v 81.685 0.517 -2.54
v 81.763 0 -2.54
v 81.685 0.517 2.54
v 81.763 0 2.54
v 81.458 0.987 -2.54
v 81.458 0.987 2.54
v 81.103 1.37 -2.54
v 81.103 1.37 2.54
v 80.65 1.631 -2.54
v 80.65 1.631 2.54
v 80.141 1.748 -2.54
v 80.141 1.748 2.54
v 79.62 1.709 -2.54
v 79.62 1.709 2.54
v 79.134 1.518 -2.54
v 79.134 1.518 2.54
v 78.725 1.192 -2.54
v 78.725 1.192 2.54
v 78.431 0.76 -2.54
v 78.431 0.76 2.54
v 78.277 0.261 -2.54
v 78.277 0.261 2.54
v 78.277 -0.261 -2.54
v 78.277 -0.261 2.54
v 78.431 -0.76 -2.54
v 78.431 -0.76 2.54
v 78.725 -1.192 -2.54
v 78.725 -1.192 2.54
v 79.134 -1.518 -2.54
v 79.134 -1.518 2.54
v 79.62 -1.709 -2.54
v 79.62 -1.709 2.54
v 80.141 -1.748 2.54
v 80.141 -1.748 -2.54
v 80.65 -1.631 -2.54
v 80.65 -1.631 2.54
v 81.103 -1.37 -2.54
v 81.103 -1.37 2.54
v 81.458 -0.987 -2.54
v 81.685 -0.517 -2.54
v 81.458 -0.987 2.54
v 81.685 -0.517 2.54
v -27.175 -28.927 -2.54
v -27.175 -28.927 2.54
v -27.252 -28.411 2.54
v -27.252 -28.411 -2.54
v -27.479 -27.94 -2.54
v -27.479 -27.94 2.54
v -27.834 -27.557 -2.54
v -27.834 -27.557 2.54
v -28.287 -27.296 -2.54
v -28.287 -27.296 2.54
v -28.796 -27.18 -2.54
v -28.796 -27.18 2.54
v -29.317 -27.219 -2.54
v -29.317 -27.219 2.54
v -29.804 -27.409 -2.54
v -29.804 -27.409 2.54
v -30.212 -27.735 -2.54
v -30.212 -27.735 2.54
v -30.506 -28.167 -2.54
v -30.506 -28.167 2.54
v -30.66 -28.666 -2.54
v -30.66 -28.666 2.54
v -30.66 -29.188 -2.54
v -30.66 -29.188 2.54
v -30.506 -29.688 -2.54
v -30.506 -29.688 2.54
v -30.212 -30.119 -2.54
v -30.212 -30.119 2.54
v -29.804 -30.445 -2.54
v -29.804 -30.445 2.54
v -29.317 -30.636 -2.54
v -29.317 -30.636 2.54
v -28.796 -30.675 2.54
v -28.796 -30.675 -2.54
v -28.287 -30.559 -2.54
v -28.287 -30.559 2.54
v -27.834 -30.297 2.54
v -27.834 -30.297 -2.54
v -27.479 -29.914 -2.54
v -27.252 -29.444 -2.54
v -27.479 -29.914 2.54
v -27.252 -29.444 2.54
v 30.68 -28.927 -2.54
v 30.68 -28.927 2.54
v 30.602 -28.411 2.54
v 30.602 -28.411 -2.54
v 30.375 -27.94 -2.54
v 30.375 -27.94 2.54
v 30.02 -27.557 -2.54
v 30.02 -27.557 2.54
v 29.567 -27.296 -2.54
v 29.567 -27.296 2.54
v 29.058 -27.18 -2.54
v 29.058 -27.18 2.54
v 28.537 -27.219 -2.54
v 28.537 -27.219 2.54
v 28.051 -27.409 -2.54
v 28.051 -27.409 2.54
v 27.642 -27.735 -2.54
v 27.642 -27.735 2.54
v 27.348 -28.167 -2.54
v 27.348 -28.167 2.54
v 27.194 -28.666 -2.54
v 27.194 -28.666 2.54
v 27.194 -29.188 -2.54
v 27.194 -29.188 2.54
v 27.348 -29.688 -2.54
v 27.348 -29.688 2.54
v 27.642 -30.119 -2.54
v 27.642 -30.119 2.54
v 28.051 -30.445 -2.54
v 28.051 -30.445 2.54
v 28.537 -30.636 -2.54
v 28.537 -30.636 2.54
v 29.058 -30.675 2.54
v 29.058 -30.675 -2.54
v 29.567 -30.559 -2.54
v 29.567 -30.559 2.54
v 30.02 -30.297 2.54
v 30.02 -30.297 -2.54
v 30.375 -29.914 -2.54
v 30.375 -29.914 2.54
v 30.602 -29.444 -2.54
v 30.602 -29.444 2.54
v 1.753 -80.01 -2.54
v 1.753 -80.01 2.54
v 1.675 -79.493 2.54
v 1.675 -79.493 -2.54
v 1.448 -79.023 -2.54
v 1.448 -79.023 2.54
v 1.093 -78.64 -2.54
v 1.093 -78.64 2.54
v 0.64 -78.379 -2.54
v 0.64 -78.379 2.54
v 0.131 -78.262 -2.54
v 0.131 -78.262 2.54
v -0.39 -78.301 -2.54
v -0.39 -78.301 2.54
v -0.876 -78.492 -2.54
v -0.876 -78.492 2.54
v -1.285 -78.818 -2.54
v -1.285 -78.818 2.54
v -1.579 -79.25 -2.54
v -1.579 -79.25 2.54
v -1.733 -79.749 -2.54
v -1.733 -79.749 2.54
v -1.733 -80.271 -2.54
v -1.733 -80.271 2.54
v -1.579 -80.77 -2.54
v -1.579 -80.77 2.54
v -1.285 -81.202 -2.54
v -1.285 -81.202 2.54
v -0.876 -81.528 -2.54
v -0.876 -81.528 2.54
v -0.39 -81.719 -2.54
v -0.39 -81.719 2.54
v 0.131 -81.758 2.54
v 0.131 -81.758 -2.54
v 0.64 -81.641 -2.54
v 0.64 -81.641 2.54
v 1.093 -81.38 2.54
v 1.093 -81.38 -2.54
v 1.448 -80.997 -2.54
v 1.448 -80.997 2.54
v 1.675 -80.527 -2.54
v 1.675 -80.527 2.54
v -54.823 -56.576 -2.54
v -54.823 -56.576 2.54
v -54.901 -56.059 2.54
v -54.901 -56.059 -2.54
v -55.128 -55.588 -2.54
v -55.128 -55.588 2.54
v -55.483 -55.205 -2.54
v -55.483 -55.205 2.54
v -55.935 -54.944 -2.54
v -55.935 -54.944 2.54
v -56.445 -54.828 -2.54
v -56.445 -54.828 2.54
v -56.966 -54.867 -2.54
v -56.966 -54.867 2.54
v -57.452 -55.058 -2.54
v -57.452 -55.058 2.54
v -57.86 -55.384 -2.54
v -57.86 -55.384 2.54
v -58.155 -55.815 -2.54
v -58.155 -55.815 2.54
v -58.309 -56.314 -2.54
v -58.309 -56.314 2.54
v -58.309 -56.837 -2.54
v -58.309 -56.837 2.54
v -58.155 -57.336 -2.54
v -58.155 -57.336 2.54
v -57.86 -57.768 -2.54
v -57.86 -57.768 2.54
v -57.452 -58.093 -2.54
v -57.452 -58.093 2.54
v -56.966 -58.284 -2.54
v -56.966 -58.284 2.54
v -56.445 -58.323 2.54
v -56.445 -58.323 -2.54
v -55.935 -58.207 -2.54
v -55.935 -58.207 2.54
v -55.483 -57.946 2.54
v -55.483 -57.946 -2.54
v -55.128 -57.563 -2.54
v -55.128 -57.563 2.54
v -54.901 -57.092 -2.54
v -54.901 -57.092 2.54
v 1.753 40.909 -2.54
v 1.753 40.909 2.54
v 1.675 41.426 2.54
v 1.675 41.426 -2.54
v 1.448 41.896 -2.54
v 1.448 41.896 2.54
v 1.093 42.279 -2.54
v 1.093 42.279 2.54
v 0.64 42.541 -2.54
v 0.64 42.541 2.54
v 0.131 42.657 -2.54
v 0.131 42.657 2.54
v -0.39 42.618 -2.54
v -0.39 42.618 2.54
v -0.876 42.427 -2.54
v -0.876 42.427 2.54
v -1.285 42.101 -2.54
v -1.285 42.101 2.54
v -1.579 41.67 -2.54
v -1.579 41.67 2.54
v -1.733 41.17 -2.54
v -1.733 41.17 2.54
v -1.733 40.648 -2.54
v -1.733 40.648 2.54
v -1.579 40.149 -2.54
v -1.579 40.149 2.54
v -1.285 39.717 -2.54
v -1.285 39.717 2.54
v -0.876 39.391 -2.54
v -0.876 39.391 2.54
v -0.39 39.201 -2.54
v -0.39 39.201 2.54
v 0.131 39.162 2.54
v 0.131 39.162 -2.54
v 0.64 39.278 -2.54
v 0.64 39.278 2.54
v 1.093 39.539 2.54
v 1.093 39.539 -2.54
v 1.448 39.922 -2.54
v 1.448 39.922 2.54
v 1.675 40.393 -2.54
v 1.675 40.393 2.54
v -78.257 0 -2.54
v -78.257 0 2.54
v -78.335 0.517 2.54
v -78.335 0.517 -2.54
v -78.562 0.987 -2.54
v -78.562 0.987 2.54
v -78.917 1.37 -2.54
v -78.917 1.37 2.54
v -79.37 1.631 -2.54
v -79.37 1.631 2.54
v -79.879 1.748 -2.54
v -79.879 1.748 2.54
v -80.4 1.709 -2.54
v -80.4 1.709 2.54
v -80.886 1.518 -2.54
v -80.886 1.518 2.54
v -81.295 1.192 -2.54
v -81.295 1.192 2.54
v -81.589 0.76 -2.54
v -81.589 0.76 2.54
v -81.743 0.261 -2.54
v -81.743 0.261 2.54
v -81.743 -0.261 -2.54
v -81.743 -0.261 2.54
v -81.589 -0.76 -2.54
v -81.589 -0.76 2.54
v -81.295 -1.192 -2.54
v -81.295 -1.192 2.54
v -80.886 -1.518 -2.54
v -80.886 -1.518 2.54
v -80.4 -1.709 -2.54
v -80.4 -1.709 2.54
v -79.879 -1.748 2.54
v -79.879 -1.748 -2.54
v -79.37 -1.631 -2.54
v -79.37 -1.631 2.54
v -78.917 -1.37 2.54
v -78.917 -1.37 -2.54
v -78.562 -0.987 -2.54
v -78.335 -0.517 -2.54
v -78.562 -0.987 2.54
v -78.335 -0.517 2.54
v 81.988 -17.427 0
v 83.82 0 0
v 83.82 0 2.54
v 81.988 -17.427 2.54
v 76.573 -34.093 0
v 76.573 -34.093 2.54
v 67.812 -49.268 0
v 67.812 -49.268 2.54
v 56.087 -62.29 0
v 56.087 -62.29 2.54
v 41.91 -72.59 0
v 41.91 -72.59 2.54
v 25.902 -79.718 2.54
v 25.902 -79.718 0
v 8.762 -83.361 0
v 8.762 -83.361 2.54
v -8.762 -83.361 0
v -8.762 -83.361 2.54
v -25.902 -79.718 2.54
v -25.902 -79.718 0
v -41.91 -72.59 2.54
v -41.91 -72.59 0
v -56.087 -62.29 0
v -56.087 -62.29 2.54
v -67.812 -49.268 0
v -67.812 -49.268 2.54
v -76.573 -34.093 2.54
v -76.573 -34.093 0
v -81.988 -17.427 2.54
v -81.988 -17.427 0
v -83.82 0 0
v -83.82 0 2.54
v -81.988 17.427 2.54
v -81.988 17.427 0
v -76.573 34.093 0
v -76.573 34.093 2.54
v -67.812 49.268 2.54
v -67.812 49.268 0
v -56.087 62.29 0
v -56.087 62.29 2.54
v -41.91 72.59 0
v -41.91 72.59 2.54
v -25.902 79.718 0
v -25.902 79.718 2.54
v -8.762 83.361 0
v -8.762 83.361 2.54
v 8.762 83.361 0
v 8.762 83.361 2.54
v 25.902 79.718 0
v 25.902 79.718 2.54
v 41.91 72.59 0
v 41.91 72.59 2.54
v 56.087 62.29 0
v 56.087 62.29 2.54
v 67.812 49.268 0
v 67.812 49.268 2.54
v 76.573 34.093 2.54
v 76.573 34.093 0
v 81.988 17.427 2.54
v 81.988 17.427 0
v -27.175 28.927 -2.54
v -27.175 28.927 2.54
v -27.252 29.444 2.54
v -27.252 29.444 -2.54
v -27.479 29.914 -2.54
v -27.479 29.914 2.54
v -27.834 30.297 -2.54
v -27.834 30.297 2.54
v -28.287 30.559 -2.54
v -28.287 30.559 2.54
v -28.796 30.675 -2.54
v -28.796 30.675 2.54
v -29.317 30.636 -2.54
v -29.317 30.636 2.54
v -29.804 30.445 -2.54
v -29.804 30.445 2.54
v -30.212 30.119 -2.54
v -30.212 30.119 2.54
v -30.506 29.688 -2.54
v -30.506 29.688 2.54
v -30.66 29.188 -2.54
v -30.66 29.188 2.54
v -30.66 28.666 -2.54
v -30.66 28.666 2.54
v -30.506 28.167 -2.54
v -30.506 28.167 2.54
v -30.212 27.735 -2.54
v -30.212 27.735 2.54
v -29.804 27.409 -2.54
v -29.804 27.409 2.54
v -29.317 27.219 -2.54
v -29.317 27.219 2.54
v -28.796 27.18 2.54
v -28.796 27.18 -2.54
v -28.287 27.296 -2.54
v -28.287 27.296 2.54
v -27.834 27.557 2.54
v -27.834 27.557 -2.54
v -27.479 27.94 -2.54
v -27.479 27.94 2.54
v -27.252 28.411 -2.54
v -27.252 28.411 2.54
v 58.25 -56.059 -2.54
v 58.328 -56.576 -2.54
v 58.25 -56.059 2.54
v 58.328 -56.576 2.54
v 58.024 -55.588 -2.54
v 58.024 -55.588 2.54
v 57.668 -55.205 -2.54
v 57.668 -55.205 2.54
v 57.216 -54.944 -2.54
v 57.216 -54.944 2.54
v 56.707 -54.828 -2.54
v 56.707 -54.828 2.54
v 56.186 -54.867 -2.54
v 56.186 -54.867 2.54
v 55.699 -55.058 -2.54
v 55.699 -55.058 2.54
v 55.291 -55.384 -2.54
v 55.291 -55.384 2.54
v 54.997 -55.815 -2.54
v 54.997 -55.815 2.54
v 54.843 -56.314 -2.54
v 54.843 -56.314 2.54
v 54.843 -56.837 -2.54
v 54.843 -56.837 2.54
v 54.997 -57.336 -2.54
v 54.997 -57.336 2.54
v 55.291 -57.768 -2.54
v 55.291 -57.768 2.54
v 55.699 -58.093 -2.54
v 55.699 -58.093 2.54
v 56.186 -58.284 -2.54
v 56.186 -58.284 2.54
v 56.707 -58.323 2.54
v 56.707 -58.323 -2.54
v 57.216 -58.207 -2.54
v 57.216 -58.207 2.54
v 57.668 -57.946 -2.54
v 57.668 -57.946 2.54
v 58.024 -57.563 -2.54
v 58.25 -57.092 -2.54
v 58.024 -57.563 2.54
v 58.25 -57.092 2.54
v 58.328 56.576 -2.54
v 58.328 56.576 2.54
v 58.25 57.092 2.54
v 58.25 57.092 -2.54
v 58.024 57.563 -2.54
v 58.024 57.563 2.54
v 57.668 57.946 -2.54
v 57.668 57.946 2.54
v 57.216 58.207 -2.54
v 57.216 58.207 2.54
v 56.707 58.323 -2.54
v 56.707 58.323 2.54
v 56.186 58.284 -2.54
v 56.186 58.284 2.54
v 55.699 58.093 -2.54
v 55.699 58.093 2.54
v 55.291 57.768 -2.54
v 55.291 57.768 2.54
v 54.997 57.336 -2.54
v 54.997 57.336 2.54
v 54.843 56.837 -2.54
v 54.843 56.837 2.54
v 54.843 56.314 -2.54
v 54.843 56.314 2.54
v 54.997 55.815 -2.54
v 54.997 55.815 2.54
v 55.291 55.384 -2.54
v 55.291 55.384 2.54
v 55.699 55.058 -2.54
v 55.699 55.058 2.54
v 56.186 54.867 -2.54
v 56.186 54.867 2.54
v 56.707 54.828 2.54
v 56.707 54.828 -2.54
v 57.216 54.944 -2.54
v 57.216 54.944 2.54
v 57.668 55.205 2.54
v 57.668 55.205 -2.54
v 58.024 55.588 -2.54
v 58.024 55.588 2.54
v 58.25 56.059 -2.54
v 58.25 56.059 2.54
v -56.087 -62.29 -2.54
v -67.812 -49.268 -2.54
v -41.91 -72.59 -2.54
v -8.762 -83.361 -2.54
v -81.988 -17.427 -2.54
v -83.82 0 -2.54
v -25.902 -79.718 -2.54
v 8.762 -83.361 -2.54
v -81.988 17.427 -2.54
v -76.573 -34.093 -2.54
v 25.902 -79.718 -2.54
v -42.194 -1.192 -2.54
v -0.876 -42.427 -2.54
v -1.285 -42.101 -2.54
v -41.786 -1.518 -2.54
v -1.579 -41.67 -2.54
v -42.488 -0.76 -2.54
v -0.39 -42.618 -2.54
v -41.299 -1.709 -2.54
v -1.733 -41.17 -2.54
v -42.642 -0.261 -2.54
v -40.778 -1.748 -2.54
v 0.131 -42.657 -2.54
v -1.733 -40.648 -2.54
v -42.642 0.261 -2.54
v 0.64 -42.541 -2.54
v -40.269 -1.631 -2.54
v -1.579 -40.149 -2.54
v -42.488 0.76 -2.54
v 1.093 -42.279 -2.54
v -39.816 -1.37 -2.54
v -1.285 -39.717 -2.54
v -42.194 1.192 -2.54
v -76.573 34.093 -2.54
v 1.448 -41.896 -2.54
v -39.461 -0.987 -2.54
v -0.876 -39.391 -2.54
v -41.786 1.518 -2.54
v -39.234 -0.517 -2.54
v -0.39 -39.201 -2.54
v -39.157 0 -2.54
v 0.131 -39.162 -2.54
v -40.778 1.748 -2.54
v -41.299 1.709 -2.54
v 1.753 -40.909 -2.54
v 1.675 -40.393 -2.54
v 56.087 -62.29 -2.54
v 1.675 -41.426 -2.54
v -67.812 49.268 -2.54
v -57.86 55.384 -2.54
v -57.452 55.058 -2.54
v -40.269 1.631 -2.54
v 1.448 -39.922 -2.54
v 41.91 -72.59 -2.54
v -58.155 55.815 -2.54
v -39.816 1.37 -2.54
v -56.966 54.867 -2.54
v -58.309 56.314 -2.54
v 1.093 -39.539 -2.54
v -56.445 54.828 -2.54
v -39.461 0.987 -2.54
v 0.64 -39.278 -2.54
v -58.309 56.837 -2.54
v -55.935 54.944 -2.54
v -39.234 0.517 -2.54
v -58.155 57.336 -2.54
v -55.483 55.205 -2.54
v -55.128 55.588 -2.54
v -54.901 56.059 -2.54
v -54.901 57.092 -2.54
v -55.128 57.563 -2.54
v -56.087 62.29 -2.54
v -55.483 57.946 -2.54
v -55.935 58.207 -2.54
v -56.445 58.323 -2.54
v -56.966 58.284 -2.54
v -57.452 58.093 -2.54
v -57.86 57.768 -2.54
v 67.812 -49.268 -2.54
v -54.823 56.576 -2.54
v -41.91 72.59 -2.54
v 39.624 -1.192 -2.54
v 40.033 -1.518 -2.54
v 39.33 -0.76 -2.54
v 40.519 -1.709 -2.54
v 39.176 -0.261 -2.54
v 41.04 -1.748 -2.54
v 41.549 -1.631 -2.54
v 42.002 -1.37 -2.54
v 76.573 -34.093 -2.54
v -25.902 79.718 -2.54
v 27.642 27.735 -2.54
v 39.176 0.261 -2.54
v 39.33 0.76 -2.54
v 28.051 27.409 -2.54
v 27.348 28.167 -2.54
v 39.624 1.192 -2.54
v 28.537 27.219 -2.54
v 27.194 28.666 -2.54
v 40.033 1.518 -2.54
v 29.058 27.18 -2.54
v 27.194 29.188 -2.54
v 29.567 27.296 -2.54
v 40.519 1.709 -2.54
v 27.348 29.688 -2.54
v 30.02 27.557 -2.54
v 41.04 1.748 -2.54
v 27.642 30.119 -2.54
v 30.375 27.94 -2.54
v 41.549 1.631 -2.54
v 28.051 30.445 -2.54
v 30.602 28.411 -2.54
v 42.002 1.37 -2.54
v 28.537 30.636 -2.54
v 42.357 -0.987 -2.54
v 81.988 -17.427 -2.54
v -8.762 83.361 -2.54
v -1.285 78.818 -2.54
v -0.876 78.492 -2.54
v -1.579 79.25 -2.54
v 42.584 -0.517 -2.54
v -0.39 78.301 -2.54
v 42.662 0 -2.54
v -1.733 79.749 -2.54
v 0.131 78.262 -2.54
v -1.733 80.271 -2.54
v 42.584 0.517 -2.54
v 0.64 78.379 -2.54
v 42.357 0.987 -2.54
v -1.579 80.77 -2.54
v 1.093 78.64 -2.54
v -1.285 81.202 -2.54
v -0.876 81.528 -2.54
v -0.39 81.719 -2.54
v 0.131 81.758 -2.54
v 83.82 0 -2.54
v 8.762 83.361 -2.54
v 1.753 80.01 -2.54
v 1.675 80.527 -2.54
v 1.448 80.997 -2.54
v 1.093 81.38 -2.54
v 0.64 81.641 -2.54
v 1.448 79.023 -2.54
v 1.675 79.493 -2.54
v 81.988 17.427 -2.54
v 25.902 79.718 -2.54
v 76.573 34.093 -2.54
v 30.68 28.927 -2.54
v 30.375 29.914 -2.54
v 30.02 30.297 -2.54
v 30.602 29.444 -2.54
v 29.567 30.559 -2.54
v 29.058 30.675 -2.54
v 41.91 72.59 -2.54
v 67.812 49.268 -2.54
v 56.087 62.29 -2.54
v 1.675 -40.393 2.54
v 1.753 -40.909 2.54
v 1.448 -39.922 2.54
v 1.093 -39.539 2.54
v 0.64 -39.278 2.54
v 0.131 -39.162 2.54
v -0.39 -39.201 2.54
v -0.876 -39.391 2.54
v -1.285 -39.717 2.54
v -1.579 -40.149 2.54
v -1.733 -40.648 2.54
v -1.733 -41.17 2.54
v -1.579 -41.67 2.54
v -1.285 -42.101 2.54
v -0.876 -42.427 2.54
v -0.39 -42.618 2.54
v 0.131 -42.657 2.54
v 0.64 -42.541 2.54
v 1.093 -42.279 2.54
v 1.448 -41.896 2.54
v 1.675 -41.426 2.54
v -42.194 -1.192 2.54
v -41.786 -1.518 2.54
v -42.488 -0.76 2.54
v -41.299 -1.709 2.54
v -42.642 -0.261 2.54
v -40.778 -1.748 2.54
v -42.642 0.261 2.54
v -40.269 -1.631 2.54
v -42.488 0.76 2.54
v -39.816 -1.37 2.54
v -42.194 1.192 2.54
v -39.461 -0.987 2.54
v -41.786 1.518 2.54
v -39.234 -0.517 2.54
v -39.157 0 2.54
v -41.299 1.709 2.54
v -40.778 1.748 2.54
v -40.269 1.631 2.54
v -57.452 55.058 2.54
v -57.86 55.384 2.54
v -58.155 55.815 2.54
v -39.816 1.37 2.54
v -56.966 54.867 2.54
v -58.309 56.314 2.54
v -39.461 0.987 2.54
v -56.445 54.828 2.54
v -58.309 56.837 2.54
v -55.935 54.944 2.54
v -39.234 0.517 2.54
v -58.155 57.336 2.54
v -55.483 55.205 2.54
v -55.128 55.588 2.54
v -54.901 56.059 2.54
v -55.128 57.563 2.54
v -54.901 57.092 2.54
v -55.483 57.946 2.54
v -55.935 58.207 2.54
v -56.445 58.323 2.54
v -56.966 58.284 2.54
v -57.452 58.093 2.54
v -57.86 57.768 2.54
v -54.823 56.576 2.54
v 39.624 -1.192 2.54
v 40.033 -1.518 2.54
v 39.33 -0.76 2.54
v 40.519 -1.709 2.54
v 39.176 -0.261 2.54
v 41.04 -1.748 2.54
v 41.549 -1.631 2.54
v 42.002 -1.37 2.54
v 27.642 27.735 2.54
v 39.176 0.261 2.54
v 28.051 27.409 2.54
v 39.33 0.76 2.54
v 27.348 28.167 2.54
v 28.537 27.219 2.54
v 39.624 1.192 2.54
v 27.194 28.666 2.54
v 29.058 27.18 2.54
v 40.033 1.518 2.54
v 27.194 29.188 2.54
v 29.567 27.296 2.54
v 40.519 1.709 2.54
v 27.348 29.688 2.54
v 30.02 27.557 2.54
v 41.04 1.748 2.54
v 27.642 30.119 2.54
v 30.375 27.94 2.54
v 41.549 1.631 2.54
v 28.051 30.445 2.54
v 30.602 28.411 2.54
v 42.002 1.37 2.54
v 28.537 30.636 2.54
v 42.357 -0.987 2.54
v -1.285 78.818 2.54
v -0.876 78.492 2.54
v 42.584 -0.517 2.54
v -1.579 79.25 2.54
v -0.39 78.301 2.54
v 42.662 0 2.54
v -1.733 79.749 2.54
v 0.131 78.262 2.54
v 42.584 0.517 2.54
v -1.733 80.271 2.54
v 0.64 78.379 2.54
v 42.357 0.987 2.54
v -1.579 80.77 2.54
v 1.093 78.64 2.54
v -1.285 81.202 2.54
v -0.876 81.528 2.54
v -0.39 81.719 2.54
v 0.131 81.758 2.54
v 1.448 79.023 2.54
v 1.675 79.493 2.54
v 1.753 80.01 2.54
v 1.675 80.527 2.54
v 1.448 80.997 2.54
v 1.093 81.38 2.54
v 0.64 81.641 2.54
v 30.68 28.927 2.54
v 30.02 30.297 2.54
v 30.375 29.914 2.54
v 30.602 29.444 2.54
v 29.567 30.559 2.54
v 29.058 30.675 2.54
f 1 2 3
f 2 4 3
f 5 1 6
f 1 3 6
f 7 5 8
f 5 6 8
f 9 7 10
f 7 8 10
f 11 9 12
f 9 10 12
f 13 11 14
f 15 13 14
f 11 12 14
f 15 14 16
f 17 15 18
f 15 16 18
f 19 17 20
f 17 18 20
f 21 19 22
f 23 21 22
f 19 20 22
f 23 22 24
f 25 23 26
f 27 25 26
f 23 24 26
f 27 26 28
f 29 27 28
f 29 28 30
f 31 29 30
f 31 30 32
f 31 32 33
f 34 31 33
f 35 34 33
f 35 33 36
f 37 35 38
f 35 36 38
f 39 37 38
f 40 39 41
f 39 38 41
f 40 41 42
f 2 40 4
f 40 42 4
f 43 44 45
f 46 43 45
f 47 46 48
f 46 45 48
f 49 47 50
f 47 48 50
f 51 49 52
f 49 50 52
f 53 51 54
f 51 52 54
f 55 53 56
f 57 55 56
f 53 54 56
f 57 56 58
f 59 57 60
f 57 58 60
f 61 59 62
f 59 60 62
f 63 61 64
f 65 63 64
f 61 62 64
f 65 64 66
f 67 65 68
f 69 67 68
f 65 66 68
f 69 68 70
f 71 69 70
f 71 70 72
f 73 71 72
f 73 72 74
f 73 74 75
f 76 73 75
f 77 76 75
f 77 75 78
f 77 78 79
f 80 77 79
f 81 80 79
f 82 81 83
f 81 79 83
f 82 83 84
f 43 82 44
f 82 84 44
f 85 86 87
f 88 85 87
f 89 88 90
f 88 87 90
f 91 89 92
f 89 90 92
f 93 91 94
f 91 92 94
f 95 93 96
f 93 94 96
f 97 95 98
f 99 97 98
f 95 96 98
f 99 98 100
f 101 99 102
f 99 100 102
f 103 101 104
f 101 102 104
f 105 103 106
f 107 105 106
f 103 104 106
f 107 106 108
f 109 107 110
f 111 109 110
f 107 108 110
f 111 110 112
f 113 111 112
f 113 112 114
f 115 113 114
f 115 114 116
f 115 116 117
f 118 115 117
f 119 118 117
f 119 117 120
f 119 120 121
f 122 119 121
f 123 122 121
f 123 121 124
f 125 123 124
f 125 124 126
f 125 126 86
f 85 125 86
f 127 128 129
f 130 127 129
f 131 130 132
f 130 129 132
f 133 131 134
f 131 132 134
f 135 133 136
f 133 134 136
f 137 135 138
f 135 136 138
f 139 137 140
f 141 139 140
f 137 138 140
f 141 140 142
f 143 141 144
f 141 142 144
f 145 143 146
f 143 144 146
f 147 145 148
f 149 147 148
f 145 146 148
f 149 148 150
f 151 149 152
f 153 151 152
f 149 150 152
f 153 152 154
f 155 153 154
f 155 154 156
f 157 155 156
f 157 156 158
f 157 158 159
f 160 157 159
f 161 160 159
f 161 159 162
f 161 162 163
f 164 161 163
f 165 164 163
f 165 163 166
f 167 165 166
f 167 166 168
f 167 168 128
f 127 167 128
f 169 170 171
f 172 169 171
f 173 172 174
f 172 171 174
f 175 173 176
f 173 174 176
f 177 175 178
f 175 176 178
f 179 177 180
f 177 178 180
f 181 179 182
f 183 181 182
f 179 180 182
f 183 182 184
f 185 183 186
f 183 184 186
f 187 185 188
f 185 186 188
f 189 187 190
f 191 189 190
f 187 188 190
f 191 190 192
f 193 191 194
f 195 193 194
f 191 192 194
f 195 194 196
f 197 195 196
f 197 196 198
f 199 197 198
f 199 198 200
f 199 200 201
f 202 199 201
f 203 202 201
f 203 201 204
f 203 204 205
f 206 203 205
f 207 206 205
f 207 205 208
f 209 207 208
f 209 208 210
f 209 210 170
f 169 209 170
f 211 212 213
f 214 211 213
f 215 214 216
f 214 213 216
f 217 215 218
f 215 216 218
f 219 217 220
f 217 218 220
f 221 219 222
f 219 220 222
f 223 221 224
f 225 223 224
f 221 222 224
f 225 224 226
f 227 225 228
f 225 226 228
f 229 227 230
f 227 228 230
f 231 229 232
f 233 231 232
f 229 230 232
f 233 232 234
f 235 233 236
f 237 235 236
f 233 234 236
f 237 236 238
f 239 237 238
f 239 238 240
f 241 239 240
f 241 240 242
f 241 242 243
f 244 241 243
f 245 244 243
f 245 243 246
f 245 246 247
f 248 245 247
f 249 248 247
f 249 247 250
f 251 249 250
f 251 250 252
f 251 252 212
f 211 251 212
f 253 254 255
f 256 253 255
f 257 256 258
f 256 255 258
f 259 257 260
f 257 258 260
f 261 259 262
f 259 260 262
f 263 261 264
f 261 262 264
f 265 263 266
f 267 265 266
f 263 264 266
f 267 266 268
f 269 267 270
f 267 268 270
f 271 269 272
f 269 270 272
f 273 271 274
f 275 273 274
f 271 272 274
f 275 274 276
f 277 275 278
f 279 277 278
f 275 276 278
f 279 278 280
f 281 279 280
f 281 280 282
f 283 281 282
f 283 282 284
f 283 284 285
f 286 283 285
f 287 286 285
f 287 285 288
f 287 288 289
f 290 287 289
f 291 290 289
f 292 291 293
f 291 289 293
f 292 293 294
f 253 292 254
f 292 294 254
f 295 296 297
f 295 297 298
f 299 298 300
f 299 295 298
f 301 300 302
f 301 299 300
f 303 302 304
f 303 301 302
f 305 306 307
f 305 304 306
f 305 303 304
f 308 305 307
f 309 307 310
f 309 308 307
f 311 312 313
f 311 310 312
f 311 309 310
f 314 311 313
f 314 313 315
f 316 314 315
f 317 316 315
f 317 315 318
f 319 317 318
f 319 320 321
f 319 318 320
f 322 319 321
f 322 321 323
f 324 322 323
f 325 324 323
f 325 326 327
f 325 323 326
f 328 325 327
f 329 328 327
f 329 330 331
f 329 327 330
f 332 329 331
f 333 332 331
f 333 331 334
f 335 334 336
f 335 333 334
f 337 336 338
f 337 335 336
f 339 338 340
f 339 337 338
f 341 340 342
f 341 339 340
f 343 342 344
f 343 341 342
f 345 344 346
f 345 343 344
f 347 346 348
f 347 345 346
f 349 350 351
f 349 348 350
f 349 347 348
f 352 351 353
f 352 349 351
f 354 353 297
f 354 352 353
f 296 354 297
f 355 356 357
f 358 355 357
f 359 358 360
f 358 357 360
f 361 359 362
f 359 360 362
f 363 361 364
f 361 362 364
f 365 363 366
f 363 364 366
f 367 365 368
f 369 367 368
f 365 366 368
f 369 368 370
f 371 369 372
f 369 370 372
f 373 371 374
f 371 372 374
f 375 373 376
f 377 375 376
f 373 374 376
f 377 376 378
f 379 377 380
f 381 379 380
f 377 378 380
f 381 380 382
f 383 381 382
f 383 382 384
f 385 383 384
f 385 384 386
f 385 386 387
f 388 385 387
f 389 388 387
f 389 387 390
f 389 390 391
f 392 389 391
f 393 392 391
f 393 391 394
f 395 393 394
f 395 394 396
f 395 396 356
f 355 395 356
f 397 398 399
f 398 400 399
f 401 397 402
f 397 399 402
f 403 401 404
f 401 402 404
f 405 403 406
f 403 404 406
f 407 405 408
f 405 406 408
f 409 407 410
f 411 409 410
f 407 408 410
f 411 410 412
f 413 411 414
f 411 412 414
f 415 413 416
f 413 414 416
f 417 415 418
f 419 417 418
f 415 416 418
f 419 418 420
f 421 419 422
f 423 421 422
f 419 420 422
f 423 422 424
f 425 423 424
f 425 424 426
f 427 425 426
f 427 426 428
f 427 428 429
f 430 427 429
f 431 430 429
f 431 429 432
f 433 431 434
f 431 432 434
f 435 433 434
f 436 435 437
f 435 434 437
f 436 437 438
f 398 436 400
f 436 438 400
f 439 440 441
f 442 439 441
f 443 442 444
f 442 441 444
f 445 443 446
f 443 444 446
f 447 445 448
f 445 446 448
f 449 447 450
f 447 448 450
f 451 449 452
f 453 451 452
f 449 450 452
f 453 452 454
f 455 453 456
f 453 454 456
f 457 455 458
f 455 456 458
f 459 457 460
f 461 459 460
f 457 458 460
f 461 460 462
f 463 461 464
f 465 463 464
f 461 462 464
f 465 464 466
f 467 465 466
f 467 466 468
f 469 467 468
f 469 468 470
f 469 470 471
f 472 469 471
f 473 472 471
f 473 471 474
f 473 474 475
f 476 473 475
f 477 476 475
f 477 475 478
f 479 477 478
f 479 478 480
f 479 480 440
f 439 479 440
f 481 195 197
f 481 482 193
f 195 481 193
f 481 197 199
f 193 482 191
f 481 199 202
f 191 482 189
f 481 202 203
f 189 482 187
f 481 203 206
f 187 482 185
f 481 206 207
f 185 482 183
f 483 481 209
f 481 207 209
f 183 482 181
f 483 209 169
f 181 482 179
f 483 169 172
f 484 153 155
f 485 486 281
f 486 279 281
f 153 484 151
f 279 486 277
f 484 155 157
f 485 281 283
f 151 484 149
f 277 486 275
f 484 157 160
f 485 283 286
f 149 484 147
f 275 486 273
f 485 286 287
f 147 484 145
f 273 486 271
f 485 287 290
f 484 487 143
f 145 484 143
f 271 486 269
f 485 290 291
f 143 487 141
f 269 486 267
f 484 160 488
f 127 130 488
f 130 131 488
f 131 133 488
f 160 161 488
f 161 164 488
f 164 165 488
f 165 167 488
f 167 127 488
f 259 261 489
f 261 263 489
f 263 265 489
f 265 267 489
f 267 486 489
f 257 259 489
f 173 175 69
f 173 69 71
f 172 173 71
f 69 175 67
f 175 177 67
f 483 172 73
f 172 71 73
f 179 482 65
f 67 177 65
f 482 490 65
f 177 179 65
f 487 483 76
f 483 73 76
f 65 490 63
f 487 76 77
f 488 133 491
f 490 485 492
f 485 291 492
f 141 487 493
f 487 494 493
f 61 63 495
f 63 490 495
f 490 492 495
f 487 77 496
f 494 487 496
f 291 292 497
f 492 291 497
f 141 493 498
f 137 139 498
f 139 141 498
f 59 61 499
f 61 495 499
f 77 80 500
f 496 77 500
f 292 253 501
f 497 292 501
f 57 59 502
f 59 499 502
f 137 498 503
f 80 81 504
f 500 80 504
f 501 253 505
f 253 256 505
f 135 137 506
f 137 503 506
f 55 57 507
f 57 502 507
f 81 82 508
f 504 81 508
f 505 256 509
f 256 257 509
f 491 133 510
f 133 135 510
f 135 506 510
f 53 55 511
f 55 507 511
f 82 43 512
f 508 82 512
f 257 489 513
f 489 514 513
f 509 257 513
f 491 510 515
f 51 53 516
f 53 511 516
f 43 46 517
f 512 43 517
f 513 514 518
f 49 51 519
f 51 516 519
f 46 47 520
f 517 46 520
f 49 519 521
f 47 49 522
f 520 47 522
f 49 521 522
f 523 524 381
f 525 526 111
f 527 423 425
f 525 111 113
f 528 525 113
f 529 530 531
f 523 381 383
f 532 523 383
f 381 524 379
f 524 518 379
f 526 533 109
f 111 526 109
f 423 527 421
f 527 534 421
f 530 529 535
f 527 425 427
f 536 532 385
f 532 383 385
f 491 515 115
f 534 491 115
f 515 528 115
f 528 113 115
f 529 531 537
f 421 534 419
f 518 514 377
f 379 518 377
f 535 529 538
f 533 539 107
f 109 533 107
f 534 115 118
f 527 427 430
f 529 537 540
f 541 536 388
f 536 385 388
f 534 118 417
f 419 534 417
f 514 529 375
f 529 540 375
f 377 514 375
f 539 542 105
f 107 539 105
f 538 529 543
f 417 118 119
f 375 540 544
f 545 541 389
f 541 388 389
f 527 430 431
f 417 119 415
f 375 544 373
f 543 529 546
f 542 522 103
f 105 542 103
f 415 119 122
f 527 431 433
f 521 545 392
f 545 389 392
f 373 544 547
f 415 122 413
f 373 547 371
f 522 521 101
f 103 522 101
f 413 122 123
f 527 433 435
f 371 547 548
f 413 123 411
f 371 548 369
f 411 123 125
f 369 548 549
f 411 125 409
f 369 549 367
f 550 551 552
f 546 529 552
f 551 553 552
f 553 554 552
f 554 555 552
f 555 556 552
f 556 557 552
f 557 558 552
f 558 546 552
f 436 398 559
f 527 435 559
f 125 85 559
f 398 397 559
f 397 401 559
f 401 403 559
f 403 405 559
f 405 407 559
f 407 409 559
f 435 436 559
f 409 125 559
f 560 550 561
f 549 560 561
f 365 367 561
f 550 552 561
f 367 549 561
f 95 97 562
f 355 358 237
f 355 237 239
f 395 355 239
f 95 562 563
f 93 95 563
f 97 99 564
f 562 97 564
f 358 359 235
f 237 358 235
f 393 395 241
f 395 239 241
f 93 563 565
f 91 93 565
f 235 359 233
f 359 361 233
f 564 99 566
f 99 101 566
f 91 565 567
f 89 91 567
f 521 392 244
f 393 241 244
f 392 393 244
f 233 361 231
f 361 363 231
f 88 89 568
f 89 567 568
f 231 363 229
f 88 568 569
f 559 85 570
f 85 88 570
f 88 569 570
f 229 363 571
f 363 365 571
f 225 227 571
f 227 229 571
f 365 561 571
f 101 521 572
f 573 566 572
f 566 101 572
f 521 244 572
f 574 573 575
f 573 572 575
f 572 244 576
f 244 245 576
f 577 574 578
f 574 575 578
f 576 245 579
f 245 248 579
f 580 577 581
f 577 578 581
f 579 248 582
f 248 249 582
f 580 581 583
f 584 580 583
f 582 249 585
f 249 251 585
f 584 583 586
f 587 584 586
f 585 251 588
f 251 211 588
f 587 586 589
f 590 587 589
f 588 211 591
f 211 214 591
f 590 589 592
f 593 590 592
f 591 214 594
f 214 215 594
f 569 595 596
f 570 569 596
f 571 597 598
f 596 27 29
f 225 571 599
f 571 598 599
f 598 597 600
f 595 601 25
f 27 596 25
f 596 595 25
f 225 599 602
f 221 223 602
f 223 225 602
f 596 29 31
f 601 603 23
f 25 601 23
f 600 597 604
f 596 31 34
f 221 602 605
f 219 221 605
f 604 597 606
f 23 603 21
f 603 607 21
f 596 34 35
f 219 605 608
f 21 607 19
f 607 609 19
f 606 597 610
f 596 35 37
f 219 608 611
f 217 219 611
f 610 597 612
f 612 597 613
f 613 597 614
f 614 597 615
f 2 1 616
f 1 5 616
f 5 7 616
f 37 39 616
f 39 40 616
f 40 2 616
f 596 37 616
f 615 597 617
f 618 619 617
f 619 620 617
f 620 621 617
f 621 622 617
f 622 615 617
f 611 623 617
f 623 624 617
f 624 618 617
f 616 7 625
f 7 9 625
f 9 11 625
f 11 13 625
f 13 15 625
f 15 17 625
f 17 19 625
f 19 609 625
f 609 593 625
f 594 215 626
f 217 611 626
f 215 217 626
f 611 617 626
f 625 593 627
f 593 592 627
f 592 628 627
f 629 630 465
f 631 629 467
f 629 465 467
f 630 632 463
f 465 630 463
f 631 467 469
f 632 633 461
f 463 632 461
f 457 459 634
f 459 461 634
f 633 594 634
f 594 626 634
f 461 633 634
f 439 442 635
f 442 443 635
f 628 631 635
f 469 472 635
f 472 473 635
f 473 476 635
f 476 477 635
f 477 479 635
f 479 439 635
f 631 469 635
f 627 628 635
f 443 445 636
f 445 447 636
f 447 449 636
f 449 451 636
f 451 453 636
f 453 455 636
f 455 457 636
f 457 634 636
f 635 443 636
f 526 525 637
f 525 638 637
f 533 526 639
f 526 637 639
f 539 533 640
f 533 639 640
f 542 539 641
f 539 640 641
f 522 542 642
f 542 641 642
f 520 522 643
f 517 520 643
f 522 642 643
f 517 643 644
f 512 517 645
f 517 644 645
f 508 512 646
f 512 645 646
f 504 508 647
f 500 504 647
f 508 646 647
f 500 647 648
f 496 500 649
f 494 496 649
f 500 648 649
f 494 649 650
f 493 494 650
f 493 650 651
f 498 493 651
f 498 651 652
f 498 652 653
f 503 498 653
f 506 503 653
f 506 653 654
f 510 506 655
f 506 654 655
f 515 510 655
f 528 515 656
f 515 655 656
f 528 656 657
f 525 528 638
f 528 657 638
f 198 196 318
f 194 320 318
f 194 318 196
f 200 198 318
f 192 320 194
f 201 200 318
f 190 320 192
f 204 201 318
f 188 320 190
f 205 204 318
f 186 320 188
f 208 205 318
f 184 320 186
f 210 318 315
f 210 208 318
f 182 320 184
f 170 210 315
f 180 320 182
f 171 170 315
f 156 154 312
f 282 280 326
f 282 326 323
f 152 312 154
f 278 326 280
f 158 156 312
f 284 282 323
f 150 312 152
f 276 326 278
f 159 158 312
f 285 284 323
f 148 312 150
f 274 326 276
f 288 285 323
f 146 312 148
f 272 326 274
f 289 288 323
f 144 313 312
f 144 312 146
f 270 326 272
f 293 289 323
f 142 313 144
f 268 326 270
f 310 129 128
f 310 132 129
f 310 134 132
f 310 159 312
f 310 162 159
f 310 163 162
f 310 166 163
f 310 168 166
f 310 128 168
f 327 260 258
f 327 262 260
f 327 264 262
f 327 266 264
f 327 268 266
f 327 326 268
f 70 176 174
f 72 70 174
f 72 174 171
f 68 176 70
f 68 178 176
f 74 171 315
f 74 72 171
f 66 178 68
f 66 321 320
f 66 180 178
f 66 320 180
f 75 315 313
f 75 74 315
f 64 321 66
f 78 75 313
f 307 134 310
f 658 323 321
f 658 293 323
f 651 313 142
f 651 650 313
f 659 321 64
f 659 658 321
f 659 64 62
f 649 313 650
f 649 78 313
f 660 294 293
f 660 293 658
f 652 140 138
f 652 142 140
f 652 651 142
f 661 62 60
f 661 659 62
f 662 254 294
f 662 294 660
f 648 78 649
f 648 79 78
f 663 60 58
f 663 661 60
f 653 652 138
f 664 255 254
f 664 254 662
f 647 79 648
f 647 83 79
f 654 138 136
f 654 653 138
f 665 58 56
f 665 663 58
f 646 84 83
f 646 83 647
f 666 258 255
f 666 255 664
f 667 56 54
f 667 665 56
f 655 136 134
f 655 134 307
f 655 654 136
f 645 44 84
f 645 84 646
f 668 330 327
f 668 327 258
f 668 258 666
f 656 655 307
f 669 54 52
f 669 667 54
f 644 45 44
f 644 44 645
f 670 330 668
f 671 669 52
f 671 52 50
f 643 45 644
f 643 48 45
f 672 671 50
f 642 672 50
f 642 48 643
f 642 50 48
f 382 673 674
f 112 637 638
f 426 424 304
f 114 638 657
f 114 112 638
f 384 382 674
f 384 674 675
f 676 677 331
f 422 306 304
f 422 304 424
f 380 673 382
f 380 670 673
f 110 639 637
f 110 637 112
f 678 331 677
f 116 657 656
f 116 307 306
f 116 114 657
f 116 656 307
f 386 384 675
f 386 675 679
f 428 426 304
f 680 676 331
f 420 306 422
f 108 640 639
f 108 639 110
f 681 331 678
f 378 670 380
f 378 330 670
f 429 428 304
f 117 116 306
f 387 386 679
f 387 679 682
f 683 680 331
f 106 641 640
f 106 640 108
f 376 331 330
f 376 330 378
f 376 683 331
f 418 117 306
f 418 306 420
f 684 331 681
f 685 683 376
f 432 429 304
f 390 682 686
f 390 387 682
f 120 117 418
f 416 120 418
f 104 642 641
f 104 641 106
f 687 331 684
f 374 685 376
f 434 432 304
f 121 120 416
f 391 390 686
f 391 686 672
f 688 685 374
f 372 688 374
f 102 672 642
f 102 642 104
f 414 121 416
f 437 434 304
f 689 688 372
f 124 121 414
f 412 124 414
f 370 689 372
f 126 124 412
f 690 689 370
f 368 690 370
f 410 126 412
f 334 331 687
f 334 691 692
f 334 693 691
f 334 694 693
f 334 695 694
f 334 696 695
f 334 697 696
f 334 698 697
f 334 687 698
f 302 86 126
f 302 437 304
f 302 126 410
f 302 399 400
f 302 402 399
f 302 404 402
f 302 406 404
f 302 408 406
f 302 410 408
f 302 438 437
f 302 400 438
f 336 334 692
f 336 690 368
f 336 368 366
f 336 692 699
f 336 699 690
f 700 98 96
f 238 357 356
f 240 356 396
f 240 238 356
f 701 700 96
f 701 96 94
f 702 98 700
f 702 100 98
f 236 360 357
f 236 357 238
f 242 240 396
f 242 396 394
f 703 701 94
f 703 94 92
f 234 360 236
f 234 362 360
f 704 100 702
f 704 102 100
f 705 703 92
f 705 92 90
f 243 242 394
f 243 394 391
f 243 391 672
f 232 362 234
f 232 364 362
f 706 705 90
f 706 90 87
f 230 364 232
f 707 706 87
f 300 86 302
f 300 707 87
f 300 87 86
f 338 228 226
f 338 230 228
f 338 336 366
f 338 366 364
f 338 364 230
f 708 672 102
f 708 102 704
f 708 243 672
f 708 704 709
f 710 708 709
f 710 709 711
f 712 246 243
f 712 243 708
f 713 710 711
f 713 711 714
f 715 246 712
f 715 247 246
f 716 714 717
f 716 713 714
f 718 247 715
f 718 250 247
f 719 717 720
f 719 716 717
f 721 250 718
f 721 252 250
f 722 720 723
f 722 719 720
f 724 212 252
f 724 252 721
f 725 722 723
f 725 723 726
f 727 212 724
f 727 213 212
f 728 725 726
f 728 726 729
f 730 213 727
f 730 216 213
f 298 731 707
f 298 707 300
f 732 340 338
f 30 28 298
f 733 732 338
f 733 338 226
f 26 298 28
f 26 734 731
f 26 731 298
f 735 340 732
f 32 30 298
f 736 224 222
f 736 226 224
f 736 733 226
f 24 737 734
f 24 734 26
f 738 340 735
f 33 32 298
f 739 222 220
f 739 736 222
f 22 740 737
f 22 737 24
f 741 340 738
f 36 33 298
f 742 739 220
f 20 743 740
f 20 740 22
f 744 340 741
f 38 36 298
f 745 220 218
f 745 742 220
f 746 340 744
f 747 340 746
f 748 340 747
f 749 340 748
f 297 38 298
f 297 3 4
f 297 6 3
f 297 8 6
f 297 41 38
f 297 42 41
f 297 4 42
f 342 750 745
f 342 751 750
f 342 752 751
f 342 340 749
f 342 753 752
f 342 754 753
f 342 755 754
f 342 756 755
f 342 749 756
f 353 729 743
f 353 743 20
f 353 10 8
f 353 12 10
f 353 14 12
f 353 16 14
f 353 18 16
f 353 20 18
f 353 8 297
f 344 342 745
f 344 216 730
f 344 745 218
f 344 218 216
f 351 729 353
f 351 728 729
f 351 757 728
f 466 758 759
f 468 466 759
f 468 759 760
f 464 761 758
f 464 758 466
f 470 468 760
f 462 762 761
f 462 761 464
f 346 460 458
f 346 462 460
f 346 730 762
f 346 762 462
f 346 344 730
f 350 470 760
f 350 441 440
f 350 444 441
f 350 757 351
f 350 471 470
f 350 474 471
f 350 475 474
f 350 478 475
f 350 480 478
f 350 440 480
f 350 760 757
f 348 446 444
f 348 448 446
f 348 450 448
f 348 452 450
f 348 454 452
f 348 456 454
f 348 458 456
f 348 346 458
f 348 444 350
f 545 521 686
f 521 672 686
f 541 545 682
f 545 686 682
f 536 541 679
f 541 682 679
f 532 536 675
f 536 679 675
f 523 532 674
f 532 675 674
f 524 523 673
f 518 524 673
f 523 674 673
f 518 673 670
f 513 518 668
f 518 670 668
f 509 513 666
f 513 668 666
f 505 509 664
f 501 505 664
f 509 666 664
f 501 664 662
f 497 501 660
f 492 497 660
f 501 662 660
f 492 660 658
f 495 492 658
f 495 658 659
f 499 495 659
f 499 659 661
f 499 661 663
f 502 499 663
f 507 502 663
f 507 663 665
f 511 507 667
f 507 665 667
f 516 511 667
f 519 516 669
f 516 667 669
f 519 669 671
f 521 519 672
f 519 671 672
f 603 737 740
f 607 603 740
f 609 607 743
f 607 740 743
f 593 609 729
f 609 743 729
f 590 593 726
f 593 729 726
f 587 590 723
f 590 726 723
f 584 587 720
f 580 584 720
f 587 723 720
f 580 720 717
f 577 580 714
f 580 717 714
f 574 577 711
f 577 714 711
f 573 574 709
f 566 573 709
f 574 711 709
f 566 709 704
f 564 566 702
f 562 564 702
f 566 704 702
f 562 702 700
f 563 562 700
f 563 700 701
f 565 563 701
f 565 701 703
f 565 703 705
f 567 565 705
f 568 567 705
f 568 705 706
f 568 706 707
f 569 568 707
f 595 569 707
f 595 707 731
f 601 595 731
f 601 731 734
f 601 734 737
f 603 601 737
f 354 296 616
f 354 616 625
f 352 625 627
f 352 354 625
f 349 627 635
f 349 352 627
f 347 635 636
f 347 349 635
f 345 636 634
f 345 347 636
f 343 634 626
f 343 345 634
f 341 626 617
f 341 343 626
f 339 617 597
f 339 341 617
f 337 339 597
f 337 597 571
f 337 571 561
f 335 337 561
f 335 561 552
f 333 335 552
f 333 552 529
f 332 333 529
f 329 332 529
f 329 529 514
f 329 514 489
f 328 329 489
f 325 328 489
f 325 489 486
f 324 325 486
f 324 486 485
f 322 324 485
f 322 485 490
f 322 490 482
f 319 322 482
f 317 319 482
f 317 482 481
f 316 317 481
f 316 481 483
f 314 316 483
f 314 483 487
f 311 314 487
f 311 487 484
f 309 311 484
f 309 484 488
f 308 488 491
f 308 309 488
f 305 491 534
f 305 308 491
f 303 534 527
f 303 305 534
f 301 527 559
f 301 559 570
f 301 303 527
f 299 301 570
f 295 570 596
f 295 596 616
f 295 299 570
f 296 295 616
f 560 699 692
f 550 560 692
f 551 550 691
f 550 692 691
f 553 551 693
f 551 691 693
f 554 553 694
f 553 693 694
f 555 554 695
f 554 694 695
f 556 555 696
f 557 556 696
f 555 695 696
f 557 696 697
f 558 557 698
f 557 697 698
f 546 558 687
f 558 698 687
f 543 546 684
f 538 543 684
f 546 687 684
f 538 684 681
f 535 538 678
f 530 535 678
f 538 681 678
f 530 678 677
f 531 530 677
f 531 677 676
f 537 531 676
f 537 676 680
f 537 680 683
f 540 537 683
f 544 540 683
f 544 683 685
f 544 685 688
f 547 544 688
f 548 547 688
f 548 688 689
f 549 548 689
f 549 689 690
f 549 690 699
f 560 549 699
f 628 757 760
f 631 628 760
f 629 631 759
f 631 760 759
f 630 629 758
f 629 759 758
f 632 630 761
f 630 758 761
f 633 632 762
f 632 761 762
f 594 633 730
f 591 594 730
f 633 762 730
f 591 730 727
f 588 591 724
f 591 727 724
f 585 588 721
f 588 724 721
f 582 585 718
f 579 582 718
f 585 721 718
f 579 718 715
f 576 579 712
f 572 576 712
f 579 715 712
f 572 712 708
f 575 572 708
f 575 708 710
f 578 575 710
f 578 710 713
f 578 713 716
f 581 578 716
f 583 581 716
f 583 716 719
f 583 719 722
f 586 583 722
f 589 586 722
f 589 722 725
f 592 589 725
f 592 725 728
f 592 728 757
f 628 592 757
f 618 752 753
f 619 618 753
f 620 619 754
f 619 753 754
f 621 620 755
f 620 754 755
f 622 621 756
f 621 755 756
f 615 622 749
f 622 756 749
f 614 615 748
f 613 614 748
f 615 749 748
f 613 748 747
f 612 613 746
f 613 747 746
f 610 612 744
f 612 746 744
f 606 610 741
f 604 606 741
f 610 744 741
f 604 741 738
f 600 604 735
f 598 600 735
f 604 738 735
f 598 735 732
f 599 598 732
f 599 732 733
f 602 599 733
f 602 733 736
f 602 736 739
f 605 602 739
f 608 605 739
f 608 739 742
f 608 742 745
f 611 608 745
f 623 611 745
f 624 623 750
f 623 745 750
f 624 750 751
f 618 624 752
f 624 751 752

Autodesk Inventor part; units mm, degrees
ref_plane "YZ Plane" through (0, 0, 0) normal (1, 0, 0) x (0, 1, 0)
ref_plane "XZ Plane" through (0, 0, 0) normal (0, 1, 0) x (-1, 0, 0)
ref_plane "XY Plane" through (0, 0, 0) normal (0, 0, 1) x (1, 0, 0)
sketch "Sketch1" plane through (0, 0, 0) normal (0, 0, 1) x (1, 0, 0)
  circle A0 centre (0, 0) radius 83.82
  dimension "d0" = 167.64
extrude "Extrusion1" add sketch "Sketch1" along normal mid plane 5.08
sketch "Sketch2" plane through (0, 0, 2.54) normal (0, 0, 1) x (1, 0, 0)
  circle A0 centre (0, 80.01) radius 1.7526
  circle A1 centre (-56.5756, 56.5756) radius 1.7526
  circle A2 centre (-80.01, 0) radius 1.7526
  circle A3 centre (-56.5756, -56.5756) radius 1.7526
  circle A4 centre (0, -80.01) radius 1.7526
  circle A5 centre (56.5756, -56.5756) radius 1.7526
  circle A6 centre (80.01, 0) radius 1.7526
  circle A7 centre (56.5756, 56.5756) radius 1.7526
  point P0 (0, 0)
  dimension "d3" = 3.5052
  dimension "d6" = 360
extrude "Extrusion2" cut sketch "Sketch2" against normal through all
sketch "Sketch3" plane through (0, 0, 2.54) normal (0, 0, 1) x (1, 0, 0)
  circle A0 centre (0, 40.9092) radius 1.7526
  circle A1 centre (-28.9272, 28.9272) radius 1.7526
  circle A2 centre (28.9272, 28.9272) radius 1.7526
  circle A3 centre (-40.9092, 0) radius 1.7526
  circle A4 centre (40.9092, 0) radius 1.7526
  circle A5 centre (0, -40.9092) radius 1.7526
  circle A6 centre (-28.9272, -28.9272) radius 1.7526
  circle A7 centre (28.9272, -28.9272) radius 1.7526
  point P0 (0, 0)
  point P1 (0, 0)
  point P2 (-37.0992, 0)
  dimension "d12" = 3.5052
  dimension "d16" = 45
  dimension "d20" = 45
  dimension "d24" = 45
  dimension "d28" = 45
extrude "Extrusion3" cut sketch "Sketch3" against normal through all
properties part number "EndCap"
